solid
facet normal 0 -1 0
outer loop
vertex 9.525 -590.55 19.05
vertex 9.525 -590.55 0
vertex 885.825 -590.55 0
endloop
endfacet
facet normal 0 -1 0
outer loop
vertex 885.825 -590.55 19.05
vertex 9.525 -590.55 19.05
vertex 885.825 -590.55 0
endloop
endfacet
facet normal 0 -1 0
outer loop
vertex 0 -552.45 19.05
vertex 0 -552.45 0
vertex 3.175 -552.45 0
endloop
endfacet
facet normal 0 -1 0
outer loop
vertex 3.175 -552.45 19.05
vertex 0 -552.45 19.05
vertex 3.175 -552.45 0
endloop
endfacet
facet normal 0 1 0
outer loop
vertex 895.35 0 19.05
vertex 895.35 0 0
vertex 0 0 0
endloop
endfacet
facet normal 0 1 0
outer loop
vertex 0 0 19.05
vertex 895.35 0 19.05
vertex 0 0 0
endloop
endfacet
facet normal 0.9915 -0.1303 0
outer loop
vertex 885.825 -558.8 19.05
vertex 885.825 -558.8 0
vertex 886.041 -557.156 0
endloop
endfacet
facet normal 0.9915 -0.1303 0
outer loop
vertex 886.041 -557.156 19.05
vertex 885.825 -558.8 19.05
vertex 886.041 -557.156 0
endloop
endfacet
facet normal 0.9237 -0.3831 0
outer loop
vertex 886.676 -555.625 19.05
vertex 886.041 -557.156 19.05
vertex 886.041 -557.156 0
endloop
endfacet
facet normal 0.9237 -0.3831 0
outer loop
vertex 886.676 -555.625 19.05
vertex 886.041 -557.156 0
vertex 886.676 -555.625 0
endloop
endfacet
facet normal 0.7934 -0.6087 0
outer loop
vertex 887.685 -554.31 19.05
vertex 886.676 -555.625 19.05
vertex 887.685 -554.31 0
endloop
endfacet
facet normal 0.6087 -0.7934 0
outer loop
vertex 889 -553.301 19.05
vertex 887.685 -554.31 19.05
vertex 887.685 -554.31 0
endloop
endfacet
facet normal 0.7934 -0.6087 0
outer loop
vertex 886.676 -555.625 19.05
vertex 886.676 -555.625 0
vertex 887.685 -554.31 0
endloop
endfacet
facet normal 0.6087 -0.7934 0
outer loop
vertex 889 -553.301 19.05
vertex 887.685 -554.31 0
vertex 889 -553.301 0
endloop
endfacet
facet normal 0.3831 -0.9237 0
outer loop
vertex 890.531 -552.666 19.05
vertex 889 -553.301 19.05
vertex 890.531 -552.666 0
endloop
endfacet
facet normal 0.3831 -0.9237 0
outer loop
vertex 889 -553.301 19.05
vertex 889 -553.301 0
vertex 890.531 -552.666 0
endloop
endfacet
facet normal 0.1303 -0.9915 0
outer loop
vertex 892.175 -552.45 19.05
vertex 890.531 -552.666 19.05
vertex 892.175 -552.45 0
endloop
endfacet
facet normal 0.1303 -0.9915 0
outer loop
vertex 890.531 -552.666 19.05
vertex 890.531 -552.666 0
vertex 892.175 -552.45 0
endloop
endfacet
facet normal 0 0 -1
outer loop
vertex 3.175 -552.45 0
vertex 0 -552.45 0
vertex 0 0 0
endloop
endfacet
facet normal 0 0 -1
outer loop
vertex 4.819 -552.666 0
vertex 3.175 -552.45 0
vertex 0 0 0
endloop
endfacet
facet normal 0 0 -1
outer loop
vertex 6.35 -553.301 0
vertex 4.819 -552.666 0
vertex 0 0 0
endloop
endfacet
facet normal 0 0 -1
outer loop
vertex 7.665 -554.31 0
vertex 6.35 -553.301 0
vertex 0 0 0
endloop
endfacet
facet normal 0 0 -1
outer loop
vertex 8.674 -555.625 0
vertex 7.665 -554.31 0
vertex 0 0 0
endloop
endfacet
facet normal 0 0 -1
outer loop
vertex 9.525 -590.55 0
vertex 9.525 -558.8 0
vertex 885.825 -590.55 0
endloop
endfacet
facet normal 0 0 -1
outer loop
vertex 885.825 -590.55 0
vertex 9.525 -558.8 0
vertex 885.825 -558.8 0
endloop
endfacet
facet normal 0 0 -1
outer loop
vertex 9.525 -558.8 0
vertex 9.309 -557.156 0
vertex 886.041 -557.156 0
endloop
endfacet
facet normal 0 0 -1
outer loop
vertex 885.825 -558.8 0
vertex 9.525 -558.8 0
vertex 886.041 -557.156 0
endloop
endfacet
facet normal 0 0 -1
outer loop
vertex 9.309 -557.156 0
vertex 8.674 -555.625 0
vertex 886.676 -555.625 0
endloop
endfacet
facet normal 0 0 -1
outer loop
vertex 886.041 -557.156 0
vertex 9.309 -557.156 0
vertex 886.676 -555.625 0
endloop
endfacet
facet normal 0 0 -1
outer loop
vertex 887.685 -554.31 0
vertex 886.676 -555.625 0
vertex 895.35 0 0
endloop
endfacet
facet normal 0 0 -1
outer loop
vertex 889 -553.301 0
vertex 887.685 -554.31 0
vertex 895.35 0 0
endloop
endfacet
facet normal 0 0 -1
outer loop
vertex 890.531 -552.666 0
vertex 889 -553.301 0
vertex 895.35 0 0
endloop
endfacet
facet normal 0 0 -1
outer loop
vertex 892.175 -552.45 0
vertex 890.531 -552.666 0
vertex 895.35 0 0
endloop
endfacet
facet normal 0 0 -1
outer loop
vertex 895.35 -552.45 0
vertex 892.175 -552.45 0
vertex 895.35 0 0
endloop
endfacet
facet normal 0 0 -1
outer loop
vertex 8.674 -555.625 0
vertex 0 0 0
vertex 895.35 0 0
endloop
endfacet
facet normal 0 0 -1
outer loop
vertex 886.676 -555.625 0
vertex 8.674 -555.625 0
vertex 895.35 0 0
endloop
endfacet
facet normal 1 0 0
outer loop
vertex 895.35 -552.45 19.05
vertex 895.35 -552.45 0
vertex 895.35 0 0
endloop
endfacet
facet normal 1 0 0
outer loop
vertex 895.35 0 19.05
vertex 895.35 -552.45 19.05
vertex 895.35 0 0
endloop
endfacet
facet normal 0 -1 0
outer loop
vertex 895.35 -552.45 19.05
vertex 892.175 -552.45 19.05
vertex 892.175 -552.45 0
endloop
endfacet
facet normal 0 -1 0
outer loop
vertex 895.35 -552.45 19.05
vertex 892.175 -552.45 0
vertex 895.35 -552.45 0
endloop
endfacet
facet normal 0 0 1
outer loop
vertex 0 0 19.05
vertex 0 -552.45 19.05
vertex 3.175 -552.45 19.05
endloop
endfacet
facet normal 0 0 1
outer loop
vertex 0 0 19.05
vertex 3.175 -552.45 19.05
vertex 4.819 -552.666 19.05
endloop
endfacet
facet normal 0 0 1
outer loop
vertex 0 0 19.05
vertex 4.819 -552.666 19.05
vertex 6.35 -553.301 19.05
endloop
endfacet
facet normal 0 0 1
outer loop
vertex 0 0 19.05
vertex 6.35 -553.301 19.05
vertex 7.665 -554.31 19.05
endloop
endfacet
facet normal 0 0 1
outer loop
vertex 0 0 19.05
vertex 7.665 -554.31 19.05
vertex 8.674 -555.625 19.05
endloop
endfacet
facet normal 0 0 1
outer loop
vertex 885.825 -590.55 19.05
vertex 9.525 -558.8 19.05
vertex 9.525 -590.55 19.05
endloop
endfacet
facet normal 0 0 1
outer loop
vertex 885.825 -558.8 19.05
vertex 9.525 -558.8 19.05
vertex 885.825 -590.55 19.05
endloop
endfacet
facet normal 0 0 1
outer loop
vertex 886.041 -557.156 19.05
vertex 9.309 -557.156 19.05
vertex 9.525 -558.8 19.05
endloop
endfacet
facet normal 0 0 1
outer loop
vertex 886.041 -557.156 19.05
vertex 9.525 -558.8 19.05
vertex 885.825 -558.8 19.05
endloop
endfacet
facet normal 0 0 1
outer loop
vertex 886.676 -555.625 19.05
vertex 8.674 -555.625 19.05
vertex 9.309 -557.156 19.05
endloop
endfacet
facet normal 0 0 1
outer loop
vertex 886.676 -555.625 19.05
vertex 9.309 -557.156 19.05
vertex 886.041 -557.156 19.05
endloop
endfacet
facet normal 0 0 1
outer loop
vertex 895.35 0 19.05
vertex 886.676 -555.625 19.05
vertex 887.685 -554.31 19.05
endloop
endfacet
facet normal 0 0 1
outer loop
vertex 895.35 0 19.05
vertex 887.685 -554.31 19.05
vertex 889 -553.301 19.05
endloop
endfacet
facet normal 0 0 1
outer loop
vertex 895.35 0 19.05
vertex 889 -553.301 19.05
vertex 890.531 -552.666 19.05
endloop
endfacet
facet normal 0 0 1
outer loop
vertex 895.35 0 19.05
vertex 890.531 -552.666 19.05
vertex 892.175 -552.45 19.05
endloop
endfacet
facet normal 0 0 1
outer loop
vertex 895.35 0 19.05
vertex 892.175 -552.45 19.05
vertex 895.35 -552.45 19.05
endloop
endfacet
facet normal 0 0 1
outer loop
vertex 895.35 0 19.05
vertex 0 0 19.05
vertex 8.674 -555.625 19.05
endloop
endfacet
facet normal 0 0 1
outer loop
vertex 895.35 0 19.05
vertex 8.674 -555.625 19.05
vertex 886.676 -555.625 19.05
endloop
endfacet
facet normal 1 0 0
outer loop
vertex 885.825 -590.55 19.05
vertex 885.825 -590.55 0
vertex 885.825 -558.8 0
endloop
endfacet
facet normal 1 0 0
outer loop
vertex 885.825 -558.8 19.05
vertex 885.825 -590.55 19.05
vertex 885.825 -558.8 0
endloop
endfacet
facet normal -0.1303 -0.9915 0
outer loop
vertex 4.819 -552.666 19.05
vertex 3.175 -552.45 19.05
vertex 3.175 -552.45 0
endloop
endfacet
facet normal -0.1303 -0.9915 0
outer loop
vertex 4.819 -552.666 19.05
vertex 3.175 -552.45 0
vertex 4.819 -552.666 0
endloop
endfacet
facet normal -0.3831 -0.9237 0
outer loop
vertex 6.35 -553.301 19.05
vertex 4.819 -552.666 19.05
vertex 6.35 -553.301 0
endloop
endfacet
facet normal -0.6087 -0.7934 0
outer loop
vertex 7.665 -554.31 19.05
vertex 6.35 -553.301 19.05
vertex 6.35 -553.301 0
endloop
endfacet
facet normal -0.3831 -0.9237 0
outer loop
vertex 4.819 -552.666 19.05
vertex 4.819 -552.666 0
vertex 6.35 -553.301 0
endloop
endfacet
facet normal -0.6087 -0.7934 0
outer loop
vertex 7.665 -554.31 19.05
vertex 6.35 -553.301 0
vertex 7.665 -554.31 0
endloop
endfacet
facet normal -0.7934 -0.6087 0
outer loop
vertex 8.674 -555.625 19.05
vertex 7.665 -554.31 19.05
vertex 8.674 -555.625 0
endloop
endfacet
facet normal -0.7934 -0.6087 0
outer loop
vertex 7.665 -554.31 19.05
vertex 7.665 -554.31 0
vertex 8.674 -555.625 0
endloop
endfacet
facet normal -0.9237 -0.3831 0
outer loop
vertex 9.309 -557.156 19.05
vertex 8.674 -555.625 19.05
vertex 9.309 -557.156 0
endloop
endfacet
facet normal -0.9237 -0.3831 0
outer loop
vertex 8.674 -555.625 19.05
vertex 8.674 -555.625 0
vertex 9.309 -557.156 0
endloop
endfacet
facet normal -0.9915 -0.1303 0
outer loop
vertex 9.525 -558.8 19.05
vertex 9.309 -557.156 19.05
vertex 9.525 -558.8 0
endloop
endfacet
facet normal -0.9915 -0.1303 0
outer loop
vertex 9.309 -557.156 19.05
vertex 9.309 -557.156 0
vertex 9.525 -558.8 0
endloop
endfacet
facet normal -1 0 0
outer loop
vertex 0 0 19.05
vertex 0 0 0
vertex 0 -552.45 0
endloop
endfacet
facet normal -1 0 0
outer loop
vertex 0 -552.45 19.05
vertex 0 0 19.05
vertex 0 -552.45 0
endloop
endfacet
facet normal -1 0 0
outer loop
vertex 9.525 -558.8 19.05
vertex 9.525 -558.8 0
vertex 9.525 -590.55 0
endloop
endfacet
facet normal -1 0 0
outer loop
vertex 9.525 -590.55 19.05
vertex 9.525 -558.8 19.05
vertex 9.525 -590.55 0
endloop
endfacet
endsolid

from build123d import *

# Parameters (mm, degrees)
F1_DEPTH = 19.05


with BuildPart() as f1:
    # F0 (on Top) → F1 (new body)
    with BuildSketch(Plane.XY):
        with BuildLine():
            Line((895.35, 0), (0, 0))
            Line((0, 0), (0, -552.45))
            Line((0, -552.45), (3.175, -552.45))
            ThreePointArc((3.175, -552.45), (7.665128, -554.309872), (9.525, -558.8))
            Line((9.525, -558.8), (9.525, -590.55))
            Line((9.525, -590.55), (885.825, -590.55))
            Line((885.825, -590.55), (885.825, -558.8))
            ThreePointArc((885.825, -558.8), (887.684872, -554.309872), (892.175, -552.45))
            Line((892.175, -552.45), (895.35, -552.45))
            Line((895.35, -552.45), (895.35, 0))
        make_face()
    extrude(amount=F1_DEPTH)


solid = f1.part
